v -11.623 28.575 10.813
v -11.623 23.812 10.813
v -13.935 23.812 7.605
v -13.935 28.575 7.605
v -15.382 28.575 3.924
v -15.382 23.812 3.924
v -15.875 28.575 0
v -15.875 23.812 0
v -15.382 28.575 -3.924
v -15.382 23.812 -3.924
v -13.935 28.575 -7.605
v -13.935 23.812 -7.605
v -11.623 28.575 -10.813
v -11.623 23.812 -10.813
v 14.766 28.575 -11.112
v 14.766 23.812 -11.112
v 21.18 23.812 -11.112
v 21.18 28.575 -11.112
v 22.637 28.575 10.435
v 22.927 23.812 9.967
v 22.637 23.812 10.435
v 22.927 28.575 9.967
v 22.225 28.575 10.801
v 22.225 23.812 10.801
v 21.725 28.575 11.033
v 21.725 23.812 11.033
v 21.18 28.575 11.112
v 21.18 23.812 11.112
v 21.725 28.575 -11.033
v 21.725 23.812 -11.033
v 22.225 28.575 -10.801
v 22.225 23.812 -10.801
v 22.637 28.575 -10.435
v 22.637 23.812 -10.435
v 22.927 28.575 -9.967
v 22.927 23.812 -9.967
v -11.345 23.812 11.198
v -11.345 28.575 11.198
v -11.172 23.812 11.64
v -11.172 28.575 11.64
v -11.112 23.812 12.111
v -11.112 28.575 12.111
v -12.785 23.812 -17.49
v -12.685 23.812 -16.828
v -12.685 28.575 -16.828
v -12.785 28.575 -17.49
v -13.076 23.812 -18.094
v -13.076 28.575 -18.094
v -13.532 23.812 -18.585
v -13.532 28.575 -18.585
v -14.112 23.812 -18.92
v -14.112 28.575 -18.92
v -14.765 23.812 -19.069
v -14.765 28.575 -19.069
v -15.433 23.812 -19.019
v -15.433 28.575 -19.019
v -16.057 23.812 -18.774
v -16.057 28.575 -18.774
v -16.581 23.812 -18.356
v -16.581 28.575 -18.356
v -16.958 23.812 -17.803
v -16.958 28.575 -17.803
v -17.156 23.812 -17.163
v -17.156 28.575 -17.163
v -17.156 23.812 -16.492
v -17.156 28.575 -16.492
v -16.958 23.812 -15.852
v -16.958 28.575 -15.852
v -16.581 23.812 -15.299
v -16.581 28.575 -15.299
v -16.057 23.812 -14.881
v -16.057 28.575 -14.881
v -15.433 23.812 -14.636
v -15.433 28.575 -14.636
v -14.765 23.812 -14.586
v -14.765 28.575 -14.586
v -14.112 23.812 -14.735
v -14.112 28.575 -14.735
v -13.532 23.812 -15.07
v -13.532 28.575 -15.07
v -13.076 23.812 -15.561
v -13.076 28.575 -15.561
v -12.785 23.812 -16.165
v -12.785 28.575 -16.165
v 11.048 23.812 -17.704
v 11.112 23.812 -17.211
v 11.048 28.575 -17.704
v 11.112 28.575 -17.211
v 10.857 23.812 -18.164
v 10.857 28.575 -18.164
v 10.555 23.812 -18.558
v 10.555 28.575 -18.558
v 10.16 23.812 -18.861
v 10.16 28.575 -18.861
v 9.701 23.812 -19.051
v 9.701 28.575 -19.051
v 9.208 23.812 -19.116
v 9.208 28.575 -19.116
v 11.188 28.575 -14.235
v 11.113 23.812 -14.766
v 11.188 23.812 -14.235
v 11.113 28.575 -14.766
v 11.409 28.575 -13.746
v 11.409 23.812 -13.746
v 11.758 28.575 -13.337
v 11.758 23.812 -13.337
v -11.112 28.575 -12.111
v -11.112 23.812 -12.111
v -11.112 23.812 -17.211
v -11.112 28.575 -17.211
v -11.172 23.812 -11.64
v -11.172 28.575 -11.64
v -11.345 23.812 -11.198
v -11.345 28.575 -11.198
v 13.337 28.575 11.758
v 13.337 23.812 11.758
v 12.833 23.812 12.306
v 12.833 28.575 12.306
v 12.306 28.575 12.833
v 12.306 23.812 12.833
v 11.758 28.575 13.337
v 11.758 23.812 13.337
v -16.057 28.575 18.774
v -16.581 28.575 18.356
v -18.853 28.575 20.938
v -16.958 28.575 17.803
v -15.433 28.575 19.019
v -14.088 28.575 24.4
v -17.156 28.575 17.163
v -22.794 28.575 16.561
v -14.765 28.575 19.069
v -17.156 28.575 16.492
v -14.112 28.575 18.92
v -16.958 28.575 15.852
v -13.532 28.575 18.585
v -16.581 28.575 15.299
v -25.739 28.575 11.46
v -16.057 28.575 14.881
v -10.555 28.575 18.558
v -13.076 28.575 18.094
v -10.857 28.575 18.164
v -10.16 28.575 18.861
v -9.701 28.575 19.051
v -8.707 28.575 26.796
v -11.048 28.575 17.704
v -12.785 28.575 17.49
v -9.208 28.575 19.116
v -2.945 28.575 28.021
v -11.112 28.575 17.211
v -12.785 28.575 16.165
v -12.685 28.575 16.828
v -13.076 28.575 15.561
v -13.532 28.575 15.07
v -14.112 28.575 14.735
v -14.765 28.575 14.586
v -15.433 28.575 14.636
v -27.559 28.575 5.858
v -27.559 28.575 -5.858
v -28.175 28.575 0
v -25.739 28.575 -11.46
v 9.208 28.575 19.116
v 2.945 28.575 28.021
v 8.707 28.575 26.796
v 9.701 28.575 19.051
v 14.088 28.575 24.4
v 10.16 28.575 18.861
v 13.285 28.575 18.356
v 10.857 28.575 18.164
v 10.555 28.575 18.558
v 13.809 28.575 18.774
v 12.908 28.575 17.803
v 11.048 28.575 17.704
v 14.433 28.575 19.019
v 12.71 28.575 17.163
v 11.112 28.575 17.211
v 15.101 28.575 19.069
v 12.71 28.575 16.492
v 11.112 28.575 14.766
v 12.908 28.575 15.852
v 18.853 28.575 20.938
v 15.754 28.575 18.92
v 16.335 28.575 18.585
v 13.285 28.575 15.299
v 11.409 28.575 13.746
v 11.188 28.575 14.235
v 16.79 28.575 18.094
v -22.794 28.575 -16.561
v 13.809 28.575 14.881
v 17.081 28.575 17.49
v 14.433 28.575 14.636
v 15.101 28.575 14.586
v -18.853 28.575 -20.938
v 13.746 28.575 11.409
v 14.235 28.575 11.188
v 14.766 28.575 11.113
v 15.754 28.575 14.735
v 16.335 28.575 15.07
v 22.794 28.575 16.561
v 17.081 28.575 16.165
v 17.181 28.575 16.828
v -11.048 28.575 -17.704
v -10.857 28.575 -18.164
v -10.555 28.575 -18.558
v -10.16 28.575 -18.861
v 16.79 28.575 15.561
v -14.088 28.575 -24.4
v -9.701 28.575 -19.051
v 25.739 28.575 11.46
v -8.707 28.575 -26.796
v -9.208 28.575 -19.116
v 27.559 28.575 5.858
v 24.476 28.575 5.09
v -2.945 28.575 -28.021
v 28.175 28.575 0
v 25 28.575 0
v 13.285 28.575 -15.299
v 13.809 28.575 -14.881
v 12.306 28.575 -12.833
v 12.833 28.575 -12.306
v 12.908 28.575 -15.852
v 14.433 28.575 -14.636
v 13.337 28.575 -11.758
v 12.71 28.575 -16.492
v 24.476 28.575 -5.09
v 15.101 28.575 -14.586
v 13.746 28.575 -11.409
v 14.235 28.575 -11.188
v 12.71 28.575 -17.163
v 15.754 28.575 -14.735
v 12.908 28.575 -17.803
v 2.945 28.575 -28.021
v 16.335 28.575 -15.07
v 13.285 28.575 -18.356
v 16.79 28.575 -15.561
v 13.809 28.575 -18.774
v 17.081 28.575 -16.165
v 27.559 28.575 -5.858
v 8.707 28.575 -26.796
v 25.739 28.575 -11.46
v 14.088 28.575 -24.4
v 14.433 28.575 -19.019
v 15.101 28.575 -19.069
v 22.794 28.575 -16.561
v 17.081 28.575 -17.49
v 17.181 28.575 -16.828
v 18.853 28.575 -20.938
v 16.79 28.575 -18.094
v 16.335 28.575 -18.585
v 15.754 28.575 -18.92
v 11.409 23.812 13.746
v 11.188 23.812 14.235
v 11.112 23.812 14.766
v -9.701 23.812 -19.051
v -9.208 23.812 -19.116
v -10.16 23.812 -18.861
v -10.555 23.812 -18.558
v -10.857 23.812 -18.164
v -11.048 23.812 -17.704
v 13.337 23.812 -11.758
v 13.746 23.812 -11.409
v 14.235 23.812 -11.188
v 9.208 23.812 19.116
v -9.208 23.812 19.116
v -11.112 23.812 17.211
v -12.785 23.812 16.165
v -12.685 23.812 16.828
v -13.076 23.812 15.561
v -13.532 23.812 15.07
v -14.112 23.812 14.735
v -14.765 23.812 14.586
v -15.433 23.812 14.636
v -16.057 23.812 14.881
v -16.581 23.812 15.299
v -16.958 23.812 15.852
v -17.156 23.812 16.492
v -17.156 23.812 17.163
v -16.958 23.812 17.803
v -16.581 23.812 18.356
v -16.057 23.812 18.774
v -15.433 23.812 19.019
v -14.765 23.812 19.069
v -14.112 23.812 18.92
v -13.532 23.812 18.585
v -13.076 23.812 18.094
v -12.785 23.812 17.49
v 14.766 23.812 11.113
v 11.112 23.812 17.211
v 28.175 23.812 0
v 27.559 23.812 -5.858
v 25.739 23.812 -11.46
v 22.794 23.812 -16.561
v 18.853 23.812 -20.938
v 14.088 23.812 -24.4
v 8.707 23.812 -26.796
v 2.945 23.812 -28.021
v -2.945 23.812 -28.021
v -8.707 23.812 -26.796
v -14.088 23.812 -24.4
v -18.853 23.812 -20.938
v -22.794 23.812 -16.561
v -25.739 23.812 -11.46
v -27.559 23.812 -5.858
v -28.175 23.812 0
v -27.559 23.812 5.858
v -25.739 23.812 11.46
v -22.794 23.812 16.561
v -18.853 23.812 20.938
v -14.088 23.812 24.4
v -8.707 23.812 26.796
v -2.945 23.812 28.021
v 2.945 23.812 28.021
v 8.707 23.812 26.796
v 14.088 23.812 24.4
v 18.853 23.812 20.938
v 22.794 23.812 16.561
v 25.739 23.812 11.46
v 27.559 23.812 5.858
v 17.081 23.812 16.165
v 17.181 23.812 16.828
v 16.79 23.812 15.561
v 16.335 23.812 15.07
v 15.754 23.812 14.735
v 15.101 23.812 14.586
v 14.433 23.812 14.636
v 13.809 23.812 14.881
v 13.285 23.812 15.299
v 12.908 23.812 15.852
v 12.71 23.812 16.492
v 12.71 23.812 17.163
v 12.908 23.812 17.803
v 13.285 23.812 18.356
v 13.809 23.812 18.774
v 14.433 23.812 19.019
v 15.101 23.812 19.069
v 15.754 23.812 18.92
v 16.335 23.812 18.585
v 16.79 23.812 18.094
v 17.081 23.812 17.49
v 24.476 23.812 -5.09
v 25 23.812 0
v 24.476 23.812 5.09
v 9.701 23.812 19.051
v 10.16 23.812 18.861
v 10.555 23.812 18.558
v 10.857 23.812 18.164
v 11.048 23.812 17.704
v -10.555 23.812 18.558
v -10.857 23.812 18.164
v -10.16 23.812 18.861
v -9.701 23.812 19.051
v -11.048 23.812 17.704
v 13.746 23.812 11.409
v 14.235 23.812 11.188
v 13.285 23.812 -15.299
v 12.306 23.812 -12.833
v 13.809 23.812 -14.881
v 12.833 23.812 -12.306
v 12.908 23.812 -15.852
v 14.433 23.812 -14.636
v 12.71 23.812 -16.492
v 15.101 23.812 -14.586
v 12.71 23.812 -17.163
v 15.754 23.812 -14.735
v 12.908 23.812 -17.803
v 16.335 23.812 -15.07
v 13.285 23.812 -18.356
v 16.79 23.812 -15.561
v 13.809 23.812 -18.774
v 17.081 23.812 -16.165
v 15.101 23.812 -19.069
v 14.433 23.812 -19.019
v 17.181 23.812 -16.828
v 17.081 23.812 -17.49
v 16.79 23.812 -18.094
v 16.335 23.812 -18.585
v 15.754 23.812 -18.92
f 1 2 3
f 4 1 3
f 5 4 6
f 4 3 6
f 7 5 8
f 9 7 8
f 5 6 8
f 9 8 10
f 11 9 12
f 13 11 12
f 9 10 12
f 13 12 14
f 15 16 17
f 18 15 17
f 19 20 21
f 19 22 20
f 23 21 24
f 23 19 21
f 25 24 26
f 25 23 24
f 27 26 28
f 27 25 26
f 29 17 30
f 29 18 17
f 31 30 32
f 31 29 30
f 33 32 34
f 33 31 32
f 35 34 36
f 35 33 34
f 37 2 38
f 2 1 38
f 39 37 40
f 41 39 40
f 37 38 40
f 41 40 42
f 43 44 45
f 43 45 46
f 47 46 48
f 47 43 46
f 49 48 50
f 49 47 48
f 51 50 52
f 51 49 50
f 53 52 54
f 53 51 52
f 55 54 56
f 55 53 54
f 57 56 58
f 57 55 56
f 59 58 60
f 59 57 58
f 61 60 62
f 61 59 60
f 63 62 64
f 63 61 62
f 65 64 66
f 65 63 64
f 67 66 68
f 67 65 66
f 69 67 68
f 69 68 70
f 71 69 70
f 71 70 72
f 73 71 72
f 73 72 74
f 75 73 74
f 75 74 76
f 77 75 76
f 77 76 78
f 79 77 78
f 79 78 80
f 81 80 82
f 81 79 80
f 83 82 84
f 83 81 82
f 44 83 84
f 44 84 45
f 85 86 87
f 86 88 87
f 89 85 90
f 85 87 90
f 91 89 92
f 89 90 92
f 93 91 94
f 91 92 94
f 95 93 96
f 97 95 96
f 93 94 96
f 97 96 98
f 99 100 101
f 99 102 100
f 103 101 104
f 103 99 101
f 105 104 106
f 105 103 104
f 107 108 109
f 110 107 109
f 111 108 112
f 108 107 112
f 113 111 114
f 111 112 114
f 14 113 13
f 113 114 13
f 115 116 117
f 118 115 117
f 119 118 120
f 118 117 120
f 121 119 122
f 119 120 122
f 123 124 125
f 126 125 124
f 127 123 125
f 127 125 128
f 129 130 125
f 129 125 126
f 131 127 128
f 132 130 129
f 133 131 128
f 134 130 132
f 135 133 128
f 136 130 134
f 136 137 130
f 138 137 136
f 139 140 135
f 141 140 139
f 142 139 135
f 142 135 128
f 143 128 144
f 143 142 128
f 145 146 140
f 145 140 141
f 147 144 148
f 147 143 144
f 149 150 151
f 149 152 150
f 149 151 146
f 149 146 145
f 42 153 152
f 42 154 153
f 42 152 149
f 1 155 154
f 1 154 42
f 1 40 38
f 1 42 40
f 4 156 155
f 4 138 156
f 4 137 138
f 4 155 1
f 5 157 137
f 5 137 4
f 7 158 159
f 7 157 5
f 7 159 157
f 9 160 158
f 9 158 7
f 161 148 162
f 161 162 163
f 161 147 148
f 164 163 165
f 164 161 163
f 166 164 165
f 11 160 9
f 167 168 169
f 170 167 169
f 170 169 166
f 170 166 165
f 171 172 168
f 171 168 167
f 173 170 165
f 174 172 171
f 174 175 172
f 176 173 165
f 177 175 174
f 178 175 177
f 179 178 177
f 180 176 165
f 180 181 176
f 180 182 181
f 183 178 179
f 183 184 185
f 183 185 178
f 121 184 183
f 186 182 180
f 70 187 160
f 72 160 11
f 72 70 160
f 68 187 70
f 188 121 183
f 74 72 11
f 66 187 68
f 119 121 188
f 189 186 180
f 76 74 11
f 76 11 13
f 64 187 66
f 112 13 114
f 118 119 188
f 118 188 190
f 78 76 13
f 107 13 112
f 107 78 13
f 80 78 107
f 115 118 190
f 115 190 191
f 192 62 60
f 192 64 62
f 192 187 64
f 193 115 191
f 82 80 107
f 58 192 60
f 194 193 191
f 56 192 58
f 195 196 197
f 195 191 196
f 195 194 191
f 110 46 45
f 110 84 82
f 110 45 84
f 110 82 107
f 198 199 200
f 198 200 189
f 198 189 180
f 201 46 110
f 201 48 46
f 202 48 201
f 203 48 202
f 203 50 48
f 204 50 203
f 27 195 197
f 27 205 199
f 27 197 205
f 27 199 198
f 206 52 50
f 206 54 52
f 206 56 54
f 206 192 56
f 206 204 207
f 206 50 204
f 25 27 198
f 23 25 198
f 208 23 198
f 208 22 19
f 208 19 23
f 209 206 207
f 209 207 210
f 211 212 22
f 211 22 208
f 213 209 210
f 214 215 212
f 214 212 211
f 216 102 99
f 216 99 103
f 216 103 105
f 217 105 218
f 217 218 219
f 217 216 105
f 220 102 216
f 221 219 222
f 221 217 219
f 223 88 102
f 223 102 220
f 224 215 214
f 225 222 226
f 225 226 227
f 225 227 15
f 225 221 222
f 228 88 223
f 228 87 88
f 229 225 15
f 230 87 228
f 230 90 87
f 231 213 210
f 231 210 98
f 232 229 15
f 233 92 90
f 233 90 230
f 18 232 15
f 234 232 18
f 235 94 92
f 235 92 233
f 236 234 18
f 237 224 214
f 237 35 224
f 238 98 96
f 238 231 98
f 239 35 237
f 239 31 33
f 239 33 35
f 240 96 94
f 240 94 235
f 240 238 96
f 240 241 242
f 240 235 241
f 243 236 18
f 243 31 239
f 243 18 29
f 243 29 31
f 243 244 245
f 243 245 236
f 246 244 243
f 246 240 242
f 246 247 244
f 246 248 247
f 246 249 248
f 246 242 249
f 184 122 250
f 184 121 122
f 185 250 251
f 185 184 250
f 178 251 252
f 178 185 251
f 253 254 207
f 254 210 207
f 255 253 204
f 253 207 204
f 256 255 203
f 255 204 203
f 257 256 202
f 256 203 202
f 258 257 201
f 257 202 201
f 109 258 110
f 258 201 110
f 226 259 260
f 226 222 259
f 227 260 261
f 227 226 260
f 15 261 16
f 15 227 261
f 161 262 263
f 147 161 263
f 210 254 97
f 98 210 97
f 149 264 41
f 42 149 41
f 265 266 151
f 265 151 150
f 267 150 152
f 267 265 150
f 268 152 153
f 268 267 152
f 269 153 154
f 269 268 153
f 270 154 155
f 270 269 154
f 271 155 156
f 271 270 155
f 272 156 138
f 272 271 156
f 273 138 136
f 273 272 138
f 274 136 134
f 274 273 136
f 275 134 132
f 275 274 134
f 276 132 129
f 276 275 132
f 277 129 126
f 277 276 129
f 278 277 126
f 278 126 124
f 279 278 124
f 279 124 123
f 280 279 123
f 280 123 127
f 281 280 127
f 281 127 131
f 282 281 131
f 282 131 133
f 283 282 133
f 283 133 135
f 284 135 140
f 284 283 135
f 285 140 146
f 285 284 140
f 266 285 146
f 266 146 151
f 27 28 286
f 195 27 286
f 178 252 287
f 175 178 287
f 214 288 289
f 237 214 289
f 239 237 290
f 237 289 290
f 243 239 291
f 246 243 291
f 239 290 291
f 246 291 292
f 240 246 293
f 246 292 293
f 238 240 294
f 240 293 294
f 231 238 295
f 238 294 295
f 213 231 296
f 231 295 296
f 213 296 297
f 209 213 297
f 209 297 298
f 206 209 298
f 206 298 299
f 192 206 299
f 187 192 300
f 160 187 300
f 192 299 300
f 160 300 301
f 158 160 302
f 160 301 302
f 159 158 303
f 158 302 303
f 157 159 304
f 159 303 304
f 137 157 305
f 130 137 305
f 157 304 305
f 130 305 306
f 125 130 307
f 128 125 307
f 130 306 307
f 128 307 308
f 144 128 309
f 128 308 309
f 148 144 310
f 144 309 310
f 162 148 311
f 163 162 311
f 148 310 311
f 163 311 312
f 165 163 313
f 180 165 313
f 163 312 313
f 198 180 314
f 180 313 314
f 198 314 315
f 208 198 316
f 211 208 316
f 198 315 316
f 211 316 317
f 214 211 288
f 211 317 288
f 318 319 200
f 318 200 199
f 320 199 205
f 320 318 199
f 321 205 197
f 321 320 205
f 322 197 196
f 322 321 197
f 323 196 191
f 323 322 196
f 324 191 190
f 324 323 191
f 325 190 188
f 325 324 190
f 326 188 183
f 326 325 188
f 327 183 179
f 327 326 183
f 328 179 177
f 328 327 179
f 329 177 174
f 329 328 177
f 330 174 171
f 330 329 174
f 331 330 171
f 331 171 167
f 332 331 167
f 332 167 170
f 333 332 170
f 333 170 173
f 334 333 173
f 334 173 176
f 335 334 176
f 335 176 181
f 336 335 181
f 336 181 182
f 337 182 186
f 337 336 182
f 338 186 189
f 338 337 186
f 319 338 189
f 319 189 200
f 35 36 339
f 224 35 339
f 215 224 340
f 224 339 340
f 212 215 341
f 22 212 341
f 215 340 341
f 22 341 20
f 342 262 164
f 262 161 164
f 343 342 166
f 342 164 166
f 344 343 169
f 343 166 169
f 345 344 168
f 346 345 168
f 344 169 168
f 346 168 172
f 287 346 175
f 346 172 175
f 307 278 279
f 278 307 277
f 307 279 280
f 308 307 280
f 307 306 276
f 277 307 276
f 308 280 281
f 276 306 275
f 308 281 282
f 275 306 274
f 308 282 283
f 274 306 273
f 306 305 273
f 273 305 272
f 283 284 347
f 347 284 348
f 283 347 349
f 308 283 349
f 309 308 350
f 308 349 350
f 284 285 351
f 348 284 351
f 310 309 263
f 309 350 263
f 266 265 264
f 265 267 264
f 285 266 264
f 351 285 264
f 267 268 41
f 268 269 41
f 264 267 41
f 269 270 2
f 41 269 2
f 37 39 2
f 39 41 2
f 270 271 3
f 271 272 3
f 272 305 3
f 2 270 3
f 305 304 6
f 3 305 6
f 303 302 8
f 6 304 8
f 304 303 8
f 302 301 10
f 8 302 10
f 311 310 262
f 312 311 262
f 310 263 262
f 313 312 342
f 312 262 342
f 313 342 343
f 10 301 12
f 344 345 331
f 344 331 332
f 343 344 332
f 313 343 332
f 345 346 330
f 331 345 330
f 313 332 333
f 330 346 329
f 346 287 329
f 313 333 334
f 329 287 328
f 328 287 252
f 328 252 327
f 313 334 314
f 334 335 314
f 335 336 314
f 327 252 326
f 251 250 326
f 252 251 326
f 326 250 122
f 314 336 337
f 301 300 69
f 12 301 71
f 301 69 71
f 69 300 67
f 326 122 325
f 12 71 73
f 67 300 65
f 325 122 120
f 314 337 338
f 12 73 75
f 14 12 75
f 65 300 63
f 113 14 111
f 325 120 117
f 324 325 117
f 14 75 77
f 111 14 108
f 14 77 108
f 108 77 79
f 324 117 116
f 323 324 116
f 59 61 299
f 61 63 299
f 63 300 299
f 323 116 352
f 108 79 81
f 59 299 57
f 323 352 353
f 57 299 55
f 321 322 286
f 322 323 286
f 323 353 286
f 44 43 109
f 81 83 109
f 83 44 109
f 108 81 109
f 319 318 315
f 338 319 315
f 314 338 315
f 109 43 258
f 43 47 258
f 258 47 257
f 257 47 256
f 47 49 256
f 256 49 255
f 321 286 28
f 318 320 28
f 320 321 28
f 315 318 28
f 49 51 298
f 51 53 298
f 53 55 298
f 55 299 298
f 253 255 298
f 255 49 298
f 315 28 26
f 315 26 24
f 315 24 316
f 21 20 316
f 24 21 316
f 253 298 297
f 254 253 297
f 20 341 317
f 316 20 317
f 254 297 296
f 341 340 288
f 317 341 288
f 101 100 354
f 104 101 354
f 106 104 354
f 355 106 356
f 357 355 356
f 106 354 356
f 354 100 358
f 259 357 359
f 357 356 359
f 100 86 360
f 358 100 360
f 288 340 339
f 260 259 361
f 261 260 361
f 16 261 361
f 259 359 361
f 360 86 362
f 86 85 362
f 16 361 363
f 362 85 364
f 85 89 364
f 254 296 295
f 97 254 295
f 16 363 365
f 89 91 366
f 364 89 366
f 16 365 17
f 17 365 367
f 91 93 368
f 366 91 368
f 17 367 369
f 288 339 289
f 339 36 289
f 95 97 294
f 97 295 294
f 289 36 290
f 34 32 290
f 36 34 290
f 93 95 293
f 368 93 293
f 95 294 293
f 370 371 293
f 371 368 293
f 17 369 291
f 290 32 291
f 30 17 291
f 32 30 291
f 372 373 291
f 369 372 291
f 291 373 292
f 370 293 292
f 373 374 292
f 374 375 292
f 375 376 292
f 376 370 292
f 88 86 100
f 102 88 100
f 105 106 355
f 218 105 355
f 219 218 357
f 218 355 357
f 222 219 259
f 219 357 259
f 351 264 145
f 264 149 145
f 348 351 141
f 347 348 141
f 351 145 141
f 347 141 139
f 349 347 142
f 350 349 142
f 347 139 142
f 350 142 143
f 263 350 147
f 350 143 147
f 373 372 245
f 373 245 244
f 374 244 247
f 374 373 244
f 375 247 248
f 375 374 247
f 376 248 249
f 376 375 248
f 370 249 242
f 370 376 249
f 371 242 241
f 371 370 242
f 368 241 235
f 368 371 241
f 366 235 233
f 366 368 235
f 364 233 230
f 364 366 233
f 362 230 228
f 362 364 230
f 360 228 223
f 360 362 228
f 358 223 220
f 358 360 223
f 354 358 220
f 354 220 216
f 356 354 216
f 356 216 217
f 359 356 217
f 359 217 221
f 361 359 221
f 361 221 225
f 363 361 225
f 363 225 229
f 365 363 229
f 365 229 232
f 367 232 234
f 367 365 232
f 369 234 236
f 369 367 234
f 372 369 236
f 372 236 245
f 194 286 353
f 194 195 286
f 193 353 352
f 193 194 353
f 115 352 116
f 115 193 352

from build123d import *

# Parameters (mm, degrees)
STOCK_DGT_START                               = 23.8125
STOCK_DGT_INSIDE_SWERVE_STRUCTURE_SM_2_R      = 28.175
STOCK_DGT_INSIDE_SWERVE_STRUCTURE_SM_2_R_2    = 2.2479
STOCK_DGT_INSIDE_SWERVE_STRUCTURE_SMALL_DEPTH = 4.7625
FILLET1_R                                     = 1.905


# Read off the part's stored shape, not the designer's step: Stock-DGT inside swerve structure Small Bearing-1
with BuildPart() as part:
    # Stock-DGT inside swerve structure Sm 2 → Stock-DGT inside swerve structure Small Bearing-1 (new body)
    with BuildSketch(Plane(origin=(0, 0, 0), x_dir=(1, 0, 0), z_dir=(0, 1, 0)).offset(STOCK_DGT_START)):
        Circle(STOCK_DGT_INSIDE_SWERVE_STRUCTURE_SM_2_R)
        with Locations((-14.933176064, -16.8275)):
            Circle(STOCK_DGT_INSIDE_SWERVE_STRUCTURE_SM_2_R_2, mode=Mode.SUBTRACT)
        with Locations((14.933176064, -16.8275)):
            Circle(STOCK_DGT_INSIDE_SWERVE_STRUCTURE_SM_2_R_2, mode=Mode.SUBTRACT)
        with Locations((-14.933176064, 16.8275)):
            Circle(STOCK_DGT_INSIDE_SWERVE_STRUCTURE_SM_2_R_2, mode=Mode.SUBTRACT)
        with BuildLine():
            ThreePointArc((11.1125, 13.879508051), (12.572358569, 12.572358569), (13.879508051, 11.1125))
            Line((13.879508051, 11.1125), (22.394471276, 11.1125))
            ThreePointArc((22.394471276, 11.1125), (25, 0), (22.394471276, -11.1125))
            Line((22.394471276, -11.1125), (13.879508051, -11.1125))
            ThreePointArc((13.879508051, -11.1125), (12.572358569, -12.572358569), (11.1125, -13.879508051))
            Line((11.1125, -13.879508051), (11.1125, -19.116031394))
            Line((11.1125, -19.116031394), (-11.1125, -19.116031394))
            Line((-11.1125, -19.116031394), (-11.1125, -11.33701763))
            ThreePointArc((-11.1125, -11.33701763), (-15.875, 0), (-11.1125, 11.33701763))
            Line((-11.1125, 11.33701763), (-11.1125, 19.116031394))
            Line((-11.1125, 19.116031394), (11.1125, 19.116031394))
            Line((11.1125, 19.116031394), (11.1125, 13.879508051))
        make_face(mode=Mode.SUBTRACT)
        with Locations((14.933176064, 16.8275)):
            Circle(STOCK_DGT_INSIDE_SWERVE_STRUCTURE_SM_2_R_2, mode=Mode.SUBTRACT)
    extrude(amount=STOCK_DGT_INSIDE_SWERVE_STRUCTURE_SMALL_DEPTH)

    # Fillet1
    fillet1_edges = [part.edges().sort_by_distance(p)[0] for p in [
        (22.394471276, 26.19375, 11.1125),
        (22.394471276, 26.19375, -11.1125),
        (11.1125, 26.19375, 13.879508051),
        (11.1125, 26.19375, -13.879508051),
        (13.879508051, 26.19375, -11.1125),
        (13.879508051, 26.19375, 11.1125),
        (-11.1125, 26.19375, -11.33701763),
        (-11.1125, 26.19375, 11.33701763),
        (11.1125, 26.19375, -19.116031394),
        (-11.1125, 26.19375, 19.116031394),
        (11.1125, 26.19375, 19.116031394),
        (-11.1125, 26.19375, -19.116031394),
    ]]
    fillet(fillet1_edges, radius=FILLET1_R)


solid = part.part
